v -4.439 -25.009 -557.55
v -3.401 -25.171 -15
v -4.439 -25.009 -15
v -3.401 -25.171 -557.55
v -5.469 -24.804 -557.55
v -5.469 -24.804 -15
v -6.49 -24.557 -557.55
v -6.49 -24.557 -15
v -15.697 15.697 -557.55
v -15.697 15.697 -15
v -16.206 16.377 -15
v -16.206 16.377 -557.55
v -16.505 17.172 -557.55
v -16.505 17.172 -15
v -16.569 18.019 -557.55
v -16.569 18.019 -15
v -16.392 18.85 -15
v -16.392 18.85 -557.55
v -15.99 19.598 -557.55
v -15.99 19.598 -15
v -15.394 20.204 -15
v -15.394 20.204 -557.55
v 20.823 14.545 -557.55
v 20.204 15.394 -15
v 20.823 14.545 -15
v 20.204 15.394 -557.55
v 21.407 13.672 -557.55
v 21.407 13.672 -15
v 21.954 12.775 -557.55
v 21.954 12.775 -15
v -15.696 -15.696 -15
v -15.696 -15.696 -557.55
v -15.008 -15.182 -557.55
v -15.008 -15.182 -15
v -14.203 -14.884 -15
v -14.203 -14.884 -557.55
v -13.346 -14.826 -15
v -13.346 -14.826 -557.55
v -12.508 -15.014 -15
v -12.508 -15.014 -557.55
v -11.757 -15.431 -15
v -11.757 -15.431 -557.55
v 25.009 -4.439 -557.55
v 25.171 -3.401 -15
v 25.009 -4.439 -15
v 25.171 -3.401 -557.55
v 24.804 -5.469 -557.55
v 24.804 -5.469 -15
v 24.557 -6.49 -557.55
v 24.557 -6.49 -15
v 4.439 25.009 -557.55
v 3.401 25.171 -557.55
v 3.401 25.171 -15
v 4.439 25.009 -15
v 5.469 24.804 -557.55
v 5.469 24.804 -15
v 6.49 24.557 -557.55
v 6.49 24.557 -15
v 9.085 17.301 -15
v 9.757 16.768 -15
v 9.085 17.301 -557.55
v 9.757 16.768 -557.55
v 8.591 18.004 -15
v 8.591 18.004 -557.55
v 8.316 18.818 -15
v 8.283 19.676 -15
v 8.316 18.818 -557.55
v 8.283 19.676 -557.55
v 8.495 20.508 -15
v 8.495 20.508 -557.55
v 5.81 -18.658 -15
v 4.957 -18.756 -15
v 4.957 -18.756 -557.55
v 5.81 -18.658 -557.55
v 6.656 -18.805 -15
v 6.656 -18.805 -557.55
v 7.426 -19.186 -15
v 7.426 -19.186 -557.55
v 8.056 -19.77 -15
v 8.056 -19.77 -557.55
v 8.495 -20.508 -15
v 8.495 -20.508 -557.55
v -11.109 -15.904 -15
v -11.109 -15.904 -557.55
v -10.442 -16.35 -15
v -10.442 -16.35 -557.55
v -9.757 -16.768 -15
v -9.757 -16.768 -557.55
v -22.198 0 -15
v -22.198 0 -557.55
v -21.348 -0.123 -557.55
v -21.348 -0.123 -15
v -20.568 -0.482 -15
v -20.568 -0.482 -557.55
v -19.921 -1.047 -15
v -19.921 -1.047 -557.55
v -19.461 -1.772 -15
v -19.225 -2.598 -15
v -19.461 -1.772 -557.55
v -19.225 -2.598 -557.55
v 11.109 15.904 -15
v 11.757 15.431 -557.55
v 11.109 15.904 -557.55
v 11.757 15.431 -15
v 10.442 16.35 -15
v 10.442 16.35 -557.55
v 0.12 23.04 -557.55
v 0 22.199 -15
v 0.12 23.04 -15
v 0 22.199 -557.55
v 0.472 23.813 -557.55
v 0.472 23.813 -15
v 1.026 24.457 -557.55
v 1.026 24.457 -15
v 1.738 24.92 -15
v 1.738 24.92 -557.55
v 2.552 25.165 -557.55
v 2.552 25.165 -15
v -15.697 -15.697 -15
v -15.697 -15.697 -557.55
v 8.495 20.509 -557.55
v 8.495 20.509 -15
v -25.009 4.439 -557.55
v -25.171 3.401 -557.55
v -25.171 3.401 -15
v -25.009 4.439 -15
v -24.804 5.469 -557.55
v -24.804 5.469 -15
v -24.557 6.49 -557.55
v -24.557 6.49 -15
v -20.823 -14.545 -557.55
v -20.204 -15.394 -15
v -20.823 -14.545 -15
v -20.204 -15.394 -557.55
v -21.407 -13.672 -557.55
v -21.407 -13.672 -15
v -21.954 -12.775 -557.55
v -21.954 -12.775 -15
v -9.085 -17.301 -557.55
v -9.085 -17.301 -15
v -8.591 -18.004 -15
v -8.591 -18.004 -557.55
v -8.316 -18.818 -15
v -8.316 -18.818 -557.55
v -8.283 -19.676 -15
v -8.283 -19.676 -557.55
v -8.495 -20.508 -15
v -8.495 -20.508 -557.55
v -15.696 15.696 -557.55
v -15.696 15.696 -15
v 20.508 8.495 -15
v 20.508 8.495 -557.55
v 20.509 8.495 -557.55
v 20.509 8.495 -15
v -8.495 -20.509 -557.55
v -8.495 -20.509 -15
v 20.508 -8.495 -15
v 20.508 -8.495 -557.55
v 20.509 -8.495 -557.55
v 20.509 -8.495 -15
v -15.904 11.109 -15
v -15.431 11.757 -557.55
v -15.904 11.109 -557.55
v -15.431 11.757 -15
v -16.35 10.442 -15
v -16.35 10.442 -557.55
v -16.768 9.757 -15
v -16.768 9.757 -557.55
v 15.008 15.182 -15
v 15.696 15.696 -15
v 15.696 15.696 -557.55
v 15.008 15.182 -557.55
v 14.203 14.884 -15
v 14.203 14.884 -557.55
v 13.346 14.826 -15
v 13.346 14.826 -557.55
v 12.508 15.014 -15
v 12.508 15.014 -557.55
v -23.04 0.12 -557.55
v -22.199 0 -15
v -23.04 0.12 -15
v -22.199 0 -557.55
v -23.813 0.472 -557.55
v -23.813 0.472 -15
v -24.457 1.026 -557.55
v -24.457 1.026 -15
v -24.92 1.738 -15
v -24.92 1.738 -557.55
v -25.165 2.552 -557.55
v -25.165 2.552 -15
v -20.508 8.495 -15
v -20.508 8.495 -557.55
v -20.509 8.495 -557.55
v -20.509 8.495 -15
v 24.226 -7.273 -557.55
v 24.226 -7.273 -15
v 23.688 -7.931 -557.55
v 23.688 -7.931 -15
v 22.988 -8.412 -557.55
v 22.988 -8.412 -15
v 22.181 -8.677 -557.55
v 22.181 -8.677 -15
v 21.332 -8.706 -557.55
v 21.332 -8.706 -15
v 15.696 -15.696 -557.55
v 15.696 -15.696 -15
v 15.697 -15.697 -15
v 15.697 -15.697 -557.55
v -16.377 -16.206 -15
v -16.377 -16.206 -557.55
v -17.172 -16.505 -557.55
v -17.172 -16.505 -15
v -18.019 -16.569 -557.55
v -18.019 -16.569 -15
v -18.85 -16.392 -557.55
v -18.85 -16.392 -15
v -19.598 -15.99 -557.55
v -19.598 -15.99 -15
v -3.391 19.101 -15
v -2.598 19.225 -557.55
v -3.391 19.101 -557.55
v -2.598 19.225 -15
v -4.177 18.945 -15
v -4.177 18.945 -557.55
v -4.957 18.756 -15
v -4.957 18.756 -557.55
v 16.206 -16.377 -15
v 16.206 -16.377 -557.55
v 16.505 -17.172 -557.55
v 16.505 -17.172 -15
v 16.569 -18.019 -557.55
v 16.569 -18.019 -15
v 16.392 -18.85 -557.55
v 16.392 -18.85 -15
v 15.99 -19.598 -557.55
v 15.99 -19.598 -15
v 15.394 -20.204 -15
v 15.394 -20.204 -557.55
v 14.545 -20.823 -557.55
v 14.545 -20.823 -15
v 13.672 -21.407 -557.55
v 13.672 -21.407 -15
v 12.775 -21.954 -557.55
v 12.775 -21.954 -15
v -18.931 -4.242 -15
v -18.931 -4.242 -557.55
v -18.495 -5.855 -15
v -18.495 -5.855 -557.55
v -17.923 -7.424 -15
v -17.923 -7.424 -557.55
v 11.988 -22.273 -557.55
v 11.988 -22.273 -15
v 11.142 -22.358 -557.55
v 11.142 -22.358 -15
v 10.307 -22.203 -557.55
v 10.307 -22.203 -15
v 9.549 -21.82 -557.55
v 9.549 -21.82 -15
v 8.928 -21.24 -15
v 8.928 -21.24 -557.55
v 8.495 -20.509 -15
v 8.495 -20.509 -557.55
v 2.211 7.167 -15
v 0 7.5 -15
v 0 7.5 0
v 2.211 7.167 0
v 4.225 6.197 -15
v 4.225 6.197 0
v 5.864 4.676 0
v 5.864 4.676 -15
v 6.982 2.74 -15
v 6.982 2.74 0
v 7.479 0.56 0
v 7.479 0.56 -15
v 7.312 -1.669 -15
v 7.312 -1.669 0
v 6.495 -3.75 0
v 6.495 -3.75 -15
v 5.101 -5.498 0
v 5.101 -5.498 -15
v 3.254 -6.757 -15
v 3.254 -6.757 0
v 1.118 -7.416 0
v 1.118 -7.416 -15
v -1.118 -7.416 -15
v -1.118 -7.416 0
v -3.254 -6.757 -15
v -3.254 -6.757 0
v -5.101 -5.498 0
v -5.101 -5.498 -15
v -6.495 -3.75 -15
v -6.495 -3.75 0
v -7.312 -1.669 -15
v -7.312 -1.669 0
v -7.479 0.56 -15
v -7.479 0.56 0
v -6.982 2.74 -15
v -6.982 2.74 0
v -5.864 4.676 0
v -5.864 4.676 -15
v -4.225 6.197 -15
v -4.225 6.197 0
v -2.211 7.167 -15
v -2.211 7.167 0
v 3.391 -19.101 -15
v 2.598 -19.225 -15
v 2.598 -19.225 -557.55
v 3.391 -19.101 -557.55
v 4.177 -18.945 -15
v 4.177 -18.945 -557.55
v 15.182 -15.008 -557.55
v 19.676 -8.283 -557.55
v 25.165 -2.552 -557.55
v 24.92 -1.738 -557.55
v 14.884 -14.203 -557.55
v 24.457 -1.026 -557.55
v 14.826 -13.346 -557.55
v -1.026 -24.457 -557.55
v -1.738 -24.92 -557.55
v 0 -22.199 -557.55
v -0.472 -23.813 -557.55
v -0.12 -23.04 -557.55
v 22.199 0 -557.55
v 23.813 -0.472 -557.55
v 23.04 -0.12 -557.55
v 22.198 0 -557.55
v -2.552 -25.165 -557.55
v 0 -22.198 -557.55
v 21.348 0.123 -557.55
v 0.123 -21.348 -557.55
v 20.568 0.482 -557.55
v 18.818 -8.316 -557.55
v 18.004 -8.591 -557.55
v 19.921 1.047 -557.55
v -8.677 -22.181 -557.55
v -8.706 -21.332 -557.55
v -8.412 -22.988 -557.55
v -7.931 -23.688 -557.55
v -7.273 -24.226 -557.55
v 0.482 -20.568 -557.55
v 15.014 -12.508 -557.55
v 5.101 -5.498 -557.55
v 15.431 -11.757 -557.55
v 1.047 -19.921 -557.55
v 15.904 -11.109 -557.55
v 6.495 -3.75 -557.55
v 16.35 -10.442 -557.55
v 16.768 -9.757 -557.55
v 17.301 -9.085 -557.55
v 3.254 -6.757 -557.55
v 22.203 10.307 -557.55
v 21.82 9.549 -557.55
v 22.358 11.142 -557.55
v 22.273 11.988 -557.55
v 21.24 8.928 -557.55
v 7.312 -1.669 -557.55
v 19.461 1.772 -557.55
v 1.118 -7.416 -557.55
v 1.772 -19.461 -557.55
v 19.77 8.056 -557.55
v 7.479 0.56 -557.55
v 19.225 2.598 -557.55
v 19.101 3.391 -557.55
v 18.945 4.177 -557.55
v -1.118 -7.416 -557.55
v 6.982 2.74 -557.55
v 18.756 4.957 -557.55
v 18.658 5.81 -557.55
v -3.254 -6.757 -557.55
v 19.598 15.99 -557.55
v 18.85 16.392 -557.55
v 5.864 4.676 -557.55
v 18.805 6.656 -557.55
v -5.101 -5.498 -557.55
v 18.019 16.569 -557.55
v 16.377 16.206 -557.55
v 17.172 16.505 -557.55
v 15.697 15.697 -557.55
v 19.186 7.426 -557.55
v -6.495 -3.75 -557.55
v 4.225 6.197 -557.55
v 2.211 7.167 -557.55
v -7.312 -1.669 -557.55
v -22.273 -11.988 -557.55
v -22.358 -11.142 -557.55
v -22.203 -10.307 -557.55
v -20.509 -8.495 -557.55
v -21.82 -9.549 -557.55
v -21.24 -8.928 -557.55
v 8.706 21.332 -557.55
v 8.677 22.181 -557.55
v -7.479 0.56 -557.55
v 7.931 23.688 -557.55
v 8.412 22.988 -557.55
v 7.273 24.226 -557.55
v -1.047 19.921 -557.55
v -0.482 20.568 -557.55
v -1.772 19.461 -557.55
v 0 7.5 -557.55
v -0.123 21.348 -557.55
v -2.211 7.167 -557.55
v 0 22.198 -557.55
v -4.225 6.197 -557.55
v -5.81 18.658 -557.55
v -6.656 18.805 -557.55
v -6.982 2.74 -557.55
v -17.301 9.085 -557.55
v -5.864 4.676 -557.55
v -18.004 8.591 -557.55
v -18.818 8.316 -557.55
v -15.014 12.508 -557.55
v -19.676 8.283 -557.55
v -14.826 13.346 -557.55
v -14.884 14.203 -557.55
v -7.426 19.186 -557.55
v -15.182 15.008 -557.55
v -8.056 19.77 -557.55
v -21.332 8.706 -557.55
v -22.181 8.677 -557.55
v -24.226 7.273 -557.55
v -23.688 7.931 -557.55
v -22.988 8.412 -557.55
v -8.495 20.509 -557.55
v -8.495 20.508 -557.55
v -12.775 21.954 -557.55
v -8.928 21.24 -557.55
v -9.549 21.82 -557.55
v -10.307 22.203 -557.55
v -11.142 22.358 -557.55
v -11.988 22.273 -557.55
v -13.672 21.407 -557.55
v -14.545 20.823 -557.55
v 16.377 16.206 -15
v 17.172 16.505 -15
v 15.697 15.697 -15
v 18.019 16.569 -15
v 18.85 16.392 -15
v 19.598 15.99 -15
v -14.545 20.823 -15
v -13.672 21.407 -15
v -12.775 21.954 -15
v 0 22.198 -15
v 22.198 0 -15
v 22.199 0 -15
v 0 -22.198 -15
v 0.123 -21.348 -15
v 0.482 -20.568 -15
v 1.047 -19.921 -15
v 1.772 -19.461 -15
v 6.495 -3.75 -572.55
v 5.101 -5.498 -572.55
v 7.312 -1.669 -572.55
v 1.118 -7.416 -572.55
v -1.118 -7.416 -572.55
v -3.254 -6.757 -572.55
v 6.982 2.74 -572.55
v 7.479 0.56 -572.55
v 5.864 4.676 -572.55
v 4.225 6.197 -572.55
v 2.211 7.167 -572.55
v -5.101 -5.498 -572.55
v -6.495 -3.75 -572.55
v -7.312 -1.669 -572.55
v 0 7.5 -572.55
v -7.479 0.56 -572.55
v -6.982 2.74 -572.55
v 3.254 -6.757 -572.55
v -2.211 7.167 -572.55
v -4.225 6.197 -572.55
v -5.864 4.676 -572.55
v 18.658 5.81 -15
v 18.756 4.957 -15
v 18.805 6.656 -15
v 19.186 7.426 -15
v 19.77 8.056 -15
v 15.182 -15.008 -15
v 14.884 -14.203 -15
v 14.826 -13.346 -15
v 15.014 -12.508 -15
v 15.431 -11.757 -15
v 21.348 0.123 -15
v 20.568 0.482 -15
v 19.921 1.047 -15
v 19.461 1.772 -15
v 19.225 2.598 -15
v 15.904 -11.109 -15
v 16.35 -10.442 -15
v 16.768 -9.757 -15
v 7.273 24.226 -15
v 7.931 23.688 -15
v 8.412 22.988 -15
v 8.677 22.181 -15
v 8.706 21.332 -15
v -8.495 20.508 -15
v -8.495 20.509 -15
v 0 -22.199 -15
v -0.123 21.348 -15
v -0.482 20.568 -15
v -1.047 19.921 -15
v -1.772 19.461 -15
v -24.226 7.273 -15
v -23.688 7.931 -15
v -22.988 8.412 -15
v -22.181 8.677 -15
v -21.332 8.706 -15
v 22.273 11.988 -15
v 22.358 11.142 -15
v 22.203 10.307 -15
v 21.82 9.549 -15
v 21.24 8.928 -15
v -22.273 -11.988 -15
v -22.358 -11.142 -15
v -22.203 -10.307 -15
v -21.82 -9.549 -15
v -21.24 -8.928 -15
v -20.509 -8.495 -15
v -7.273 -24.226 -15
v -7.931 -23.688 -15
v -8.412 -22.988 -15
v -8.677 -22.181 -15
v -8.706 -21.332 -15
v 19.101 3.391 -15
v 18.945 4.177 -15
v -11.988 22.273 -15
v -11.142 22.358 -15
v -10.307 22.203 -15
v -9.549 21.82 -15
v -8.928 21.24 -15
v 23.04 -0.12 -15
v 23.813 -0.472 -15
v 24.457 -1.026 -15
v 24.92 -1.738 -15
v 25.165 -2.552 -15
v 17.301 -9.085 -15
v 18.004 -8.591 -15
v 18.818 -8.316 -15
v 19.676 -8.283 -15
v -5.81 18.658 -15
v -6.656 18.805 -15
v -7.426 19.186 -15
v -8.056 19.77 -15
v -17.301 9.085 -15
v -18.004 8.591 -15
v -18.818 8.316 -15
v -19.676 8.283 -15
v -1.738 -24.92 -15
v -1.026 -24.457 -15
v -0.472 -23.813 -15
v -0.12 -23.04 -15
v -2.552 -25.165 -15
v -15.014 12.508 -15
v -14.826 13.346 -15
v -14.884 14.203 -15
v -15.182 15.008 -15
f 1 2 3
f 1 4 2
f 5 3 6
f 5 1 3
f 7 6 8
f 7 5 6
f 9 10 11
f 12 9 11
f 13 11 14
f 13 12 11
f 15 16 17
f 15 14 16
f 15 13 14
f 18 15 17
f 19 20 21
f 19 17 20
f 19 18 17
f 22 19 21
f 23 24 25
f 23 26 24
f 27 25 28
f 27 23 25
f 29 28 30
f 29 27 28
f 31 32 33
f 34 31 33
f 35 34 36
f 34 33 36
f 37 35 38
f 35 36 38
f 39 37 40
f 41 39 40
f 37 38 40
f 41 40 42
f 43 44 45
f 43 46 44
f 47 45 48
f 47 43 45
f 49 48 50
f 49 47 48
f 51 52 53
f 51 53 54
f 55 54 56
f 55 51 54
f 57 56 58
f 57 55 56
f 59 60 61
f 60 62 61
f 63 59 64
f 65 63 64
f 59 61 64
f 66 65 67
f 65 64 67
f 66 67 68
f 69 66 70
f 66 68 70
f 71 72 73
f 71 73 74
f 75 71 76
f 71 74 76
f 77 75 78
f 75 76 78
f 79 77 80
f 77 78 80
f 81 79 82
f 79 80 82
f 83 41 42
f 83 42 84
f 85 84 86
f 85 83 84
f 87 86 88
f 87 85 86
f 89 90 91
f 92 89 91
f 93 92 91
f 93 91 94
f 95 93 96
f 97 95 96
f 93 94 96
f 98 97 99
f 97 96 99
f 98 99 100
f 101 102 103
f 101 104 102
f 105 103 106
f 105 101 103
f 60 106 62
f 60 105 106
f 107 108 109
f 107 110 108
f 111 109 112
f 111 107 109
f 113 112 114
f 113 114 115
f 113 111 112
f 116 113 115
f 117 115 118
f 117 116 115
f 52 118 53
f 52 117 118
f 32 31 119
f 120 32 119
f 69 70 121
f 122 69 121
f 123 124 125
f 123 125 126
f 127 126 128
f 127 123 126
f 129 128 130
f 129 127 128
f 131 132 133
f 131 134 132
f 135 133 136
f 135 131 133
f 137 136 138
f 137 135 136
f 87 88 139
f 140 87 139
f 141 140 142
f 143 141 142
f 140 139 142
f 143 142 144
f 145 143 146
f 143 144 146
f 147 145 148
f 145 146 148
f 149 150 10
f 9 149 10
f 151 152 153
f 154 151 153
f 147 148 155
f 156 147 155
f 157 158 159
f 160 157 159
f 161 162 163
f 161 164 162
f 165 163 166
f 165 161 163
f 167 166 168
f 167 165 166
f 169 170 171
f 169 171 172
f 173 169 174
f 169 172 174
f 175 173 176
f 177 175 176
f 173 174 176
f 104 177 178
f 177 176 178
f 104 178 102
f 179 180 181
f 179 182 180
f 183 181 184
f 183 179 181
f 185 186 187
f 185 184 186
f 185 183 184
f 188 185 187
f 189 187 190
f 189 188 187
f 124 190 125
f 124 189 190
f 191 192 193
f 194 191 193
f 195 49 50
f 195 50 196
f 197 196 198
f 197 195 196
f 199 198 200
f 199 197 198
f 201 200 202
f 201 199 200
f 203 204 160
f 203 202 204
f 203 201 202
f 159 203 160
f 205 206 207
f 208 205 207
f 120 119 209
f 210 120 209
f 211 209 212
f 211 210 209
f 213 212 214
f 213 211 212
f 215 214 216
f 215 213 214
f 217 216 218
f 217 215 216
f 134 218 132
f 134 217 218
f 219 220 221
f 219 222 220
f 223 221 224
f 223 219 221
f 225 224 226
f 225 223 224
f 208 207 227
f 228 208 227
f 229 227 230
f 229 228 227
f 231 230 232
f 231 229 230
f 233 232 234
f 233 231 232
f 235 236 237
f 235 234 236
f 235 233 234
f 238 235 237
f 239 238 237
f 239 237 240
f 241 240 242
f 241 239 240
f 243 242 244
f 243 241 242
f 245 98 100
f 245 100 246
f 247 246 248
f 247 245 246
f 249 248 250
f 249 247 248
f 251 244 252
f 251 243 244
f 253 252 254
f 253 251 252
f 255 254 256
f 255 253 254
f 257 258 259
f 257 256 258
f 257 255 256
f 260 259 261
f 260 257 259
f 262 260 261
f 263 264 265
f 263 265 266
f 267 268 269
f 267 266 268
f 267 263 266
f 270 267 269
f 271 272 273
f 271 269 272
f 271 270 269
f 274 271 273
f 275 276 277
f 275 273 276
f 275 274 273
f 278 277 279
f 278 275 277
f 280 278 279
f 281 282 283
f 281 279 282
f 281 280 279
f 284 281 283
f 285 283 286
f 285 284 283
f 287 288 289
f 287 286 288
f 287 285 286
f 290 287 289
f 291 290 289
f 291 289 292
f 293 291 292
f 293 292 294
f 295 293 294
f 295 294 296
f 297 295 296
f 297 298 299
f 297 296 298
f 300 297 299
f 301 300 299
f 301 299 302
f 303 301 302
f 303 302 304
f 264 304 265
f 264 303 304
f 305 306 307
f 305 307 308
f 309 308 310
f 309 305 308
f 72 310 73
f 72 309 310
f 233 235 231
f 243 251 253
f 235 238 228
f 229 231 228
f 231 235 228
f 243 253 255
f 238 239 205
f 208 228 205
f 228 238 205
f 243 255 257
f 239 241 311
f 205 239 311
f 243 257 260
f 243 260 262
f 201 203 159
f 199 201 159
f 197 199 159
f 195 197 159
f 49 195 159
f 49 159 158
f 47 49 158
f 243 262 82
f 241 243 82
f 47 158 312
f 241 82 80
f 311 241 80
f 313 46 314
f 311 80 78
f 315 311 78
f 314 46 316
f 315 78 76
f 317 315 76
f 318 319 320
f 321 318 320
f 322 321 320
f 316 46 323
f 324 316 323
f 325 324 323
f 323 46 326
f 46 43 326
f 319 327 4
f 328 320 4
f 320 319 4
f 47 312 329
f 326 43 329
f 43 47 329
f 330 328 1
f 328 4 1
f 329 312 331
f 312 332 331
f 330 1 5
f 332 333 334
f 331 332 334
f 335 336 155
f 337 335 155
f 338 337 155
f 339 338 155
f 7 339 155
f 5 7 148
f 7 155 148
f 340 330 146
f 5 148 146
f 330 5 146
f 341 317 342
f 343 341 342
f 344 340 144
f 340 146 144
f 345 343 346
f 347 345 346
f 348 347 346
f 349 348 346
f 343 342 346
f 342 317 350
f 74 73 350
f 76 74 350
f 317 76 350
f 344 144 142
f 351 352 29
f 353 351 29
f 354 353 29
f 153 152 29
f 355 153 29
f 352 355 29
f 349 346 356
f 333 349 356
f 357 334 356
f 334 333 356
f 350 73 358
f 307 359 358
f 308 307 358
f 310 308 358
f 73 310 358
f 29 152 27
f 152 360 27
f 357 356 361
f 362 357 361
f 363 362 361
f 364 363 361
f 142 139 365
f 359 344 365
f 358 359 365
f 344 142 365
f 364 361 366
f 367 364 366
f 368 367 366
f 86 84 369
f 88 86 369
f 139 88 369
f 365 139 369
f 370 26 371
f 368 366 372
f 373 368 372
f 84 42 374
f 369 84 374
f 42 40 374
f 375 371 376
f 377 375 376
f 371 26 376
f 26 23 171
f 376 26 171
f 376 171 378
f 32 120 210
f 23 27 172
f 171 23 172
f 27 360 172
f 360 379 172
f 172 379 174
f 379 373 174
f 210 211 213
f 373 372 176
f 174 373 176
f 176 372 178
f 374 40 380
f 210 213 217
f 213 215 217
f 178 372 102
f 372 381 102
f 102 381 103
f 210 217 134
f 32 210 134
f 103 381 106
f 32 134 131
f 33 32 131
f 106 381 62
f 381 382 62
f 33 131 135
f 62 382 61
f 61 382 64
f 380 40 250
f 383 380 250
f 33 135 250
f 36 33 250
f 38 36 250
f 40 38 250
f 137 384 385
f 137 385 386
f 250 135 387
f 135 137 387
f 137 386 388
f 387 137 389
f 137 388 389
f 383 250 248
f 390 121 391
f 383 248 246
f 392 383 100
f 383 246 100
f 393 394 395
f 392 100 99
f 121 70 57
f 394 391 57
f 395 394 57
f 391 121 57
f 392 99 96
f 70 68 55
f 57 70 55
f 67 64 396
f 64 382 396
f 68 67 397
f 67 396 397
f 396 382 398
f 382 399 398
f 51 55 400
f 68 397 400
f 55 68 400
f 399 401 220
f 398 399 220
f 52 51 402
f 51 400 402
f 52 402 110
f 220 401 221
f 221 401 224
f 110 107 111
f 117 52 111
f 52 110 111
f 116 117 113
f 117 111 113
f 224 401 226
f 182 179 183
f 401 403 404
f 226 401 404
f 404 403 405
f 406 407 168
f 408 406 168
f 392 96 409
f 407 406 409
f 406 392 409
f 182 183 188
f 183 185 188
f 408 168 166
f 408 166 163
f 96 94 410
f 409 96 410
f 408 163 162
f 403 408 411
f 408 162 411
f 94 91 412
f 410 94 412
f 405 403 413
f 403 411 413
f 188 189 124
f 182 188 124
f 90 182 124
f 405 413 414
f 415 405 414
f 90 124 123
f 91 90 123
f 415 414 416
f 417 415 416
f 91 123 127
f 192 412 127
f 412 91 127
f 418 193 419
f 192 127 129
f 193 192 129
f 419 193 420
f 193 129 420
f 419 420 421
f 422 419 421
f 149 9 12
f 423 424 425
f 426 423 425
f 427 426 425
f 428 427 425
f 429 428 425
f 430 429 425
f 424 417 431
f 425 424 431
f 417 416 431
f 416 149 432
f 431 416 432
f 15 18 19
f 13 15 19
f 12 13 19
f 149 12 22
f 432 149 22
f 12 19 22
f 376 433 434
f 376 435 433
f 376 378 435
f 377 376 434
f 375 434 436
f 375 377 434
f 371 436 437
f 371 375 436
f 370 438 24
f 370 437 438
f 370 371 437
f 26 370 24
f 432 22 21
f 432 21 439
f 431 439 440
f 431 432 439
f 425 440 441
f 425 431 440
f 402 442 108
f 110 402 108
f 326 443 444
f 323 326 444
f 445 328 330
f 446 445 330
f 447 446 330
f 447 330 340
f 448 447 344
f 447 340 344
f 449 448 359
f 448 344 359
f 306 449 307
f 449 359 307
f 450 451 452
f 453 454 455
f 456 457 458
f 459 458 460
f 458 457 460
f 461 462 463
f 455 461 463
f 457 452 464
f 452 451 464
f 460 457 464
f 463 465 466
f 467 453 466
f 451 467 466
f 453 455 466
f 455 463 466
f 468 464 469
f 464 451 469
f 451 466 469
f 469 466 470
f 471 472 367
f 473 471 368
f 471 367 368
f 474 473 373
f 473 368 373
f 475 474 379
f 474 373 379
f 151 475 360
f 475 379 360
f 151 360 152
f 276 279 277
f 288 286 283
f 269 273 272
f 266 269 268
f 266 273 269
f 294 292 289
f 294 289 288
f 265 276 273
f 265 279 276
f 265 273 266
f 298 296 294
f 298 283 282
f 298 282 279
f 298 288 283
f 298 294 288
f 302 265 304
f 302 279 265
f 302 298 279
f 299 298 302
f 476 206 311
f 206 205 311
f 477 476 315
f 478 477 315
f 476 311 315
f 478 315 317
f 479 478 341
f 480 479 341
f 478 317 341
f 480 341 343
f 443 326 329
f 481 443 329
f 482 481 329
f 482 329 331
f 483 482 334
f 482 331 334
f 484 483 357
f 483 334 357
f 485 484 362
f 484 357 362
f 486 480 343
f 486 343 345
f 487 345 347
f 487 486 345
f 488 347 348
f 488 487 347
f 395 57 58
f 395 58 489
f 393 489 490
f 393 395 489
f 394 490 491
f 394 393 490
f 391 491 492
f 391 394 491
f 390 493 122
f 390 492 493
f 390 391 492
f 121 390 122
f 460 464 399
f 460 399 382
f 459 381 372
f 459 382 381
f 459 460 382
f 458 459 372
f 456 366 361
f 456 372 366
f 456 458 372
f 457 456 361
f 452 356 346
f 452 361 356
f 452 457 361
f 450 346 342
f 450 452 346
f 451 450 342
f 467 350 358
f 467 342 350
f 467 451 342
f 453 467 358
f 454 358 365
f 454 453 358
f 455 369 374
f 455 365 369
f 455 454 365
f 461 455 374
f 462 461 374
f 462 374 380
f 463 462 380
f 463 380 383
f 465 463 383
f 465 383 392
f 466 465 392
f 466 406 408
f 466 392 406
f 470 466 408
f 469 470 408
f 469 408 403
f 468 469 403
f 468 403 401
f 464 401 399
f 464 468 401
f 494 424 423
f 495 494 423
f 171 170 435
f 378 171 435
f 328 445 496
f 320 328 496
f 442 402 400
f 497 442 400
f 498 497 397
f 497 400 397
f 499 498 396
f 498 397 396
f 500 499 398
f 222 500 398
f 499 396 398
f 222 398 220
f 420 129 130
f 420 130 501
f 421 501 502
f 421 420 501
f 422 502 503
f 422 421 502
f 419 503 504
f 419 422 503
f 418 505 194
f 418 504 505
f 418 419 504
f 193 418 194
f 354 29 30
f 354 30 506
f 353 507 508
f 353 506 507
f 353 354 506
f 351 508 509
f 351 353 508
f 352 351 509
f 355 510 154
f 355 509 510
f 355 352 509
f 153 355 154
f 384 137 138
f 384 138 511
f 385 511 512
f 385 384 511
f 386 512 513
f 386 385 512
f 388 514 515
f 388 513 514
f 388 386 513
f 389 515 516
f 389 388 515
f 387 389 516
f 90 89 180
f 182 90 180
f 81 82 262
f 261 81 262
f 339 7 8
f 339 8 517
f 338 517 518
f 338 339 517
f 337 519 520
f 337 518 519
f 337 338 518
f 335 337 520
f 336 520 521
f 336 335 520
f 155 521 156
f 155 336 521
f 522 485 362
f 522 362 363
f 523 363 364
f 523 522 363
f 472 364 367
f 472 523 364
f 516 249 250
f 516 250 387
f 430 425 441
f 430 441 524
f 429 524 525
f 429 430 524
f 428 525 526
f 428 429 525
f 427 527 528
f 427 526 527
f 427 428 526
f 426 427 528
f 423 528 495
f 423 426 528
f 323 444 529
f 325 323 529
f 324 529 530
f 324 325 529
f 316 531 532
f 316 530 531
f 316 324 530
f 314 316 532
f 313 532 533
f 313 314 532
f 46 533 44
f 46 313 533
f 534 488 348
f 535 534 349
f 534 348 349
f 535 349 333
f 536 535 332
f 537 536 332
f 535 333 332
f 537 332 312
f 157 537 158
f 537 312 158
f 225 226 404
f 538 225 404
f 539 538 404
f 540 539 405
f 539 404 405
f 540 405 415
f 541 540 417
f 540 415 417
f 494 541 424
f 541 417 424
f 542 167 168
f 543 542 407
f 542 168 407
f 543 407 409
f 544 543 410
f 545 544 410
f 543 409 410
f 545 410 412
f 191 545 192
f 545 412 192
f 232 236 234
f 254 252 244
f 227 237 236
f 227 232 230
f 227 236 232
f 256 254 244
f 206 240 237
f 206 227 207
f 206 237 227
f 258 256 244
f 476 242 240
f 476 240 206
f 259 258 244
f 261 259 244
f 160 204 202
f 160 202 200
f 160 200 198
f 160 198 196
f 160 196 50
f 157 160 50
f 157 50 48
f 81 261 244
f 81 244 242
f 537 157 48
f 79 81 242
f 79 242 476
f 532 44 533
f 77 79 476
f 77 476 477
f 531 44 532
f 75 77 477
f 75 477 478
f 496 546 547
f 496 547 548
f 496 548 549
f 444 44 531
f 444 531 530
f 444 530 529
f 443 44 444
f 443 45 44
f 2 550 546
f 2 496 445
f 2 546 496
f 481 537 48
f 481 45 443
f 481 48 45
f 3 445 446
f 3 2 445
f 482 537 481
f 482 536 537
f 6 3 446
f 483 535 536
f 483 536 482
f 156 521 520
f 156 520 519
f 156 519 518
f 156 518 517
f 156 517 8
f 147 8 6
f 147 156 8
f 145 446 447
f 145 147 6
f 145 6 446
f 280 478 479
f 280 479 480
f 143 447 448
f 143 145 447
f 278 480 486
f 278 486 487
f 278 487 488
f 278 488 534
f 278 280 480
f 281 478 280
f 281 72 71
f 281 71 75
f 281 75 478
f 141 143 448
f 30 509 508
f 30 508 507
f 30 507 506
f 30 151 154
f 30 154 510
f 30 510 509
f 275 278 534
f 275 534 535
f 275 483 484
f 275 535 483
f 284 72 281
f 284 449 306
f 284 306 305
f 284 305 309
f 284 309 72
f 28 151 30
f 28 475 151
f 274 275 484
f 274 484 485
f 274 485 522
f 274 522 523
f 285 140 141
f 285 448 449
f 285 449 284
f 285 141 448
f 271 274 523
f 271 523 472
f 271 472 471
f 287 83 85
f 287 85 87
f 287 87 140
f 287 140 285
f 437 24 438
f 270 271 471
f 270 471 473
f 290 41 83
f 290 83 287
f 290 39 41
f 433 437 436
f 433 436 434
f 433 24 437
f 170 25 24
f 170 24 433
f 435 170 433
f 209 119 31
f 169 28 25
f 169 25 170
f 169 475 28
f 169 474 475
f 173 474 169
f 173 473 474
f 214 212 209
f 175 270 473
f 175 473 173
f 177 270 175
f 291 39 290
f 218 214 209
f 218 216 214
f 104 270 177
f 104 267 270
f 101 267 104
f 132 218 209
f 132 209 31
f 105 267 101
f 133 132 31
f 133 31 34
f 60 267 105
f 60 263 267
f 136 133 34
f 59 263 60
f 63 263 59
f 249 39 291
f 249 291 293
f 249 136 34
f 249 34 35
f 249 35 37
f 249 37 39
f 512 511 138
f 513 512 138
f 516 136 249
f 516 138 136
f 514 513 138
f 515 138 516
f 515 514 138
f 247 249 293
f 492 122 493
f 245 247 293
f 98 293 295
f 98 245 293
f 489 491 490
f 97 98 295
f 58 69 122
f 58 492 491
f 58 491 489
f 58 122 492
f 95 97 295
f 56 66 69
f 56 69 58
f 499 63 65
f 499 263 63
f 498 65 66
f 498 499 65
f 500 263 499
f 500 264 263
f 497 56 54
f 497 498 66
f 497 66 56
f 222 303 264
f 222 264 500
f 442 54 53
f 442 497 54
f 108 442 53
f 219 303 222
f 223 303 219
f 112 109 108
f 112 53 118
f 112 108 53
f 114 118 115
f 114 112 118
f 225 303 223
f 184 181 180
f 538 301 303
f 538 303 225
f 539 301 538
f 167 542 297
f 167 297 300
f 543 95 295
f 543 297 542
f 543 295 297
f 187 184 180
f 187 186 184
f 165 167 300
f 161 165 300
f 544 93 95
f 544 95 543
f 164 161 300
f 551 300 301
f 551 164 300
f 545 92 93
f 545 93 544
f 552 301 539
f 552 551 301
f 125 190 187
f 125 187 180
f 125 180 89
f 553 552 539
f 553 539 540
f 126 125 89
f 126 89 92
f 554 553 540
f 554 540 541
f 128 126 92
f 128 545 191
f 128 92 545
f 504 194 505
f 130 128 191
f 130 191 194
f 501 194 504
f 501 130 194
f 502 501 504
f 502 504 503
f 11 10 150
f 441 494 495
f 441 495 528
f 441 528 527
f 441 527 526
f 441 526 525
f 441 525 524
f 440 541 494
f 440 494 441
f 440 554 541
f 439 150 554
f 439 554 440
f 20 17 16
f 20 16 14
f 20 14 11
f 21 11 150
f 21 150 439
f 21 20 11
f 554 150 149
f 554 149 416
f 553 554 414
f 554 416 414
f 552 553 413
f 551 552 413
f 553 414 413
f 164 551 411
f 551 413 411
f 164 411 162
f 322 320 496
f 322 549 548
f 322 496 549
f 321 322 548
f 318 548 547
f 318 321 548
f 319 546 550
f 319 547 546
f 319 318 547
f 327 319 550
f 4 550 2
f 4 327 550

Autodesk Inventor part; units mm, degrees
ref_plane "YZ Plane" through (0, 0, 0) normal (1, 0, 0) x (0, 1, 0)
ref_plane "XZ Plane" through (0, 0, 0) normal (0, 1, 0) x (-1, 0, 0)
ref_plane "XY Plane" through (0, 0, 0) normal (0, 0, 1) x (1, 0, 0)
sketch "Esboço1" plane through (0, 0, 0) normal (1, 0, 0) x (0, 1, 0)
  line L0 (0, 0) -> (0, -572.55)
  line L1 (0, 0) -> (7.5, 0)
  line L2 (7.5, 0) -> (7.5, -572.55)
  line L3 (7.5, -572.55) -> (0, -572.55)
  line L4 (0, -572.55) -> (0, 0)
  line L5 (7.5, -15) -> (25.4, -15)
  line L6 (25.4, -15) -> (25.4, -557.55)
  line L7 (25.4, -557.55) -> (7.5, -557.55)
  line L8 (7.5, -557.55) -> (7.5, -15)
  point P0 (3.75, 0)
  point P1 (3.75, -572.55)
  point P2 (0, -545.49)
  point P3 (7.5, -557.55)
  dimension "d0" = 572.55
  dimension "d1" = 7.5
  dimension "d2" = 25.4
  dimension "d3" = 15
  dimension "d4" = 15
revolve "Revolução1" add sketch "Esboço1" angle 360 about axis through (0, 0, -572.55) along (0, 0, 1)
sketch "Esboço2" plane through (0, 0, -15) normal (0, 0, 1) x (1, 0, 0)
  circle A0 centre (0, 0) radius 7.5 projected
  circle A1 centre (0, 0) radius 25.4 projected
  circle A2 centre (0, 0) radius 7.5 projected
  line L0 (0, 0) -> (0, 25.4)
  line L1 (0, 0) -> (-25.4, 0)
  line L2 (0, 0) -> (0, -25.4)
  line L3 (0, 0) -> (25.4, 0)
  line L4 (0, 0) -> (17.9605, 17.9605)
  line L5 (0, 0) -> (9.7202, 23.4665)
  line L6 (0, 0) -> (23.4665, 9.7202)
  line L7 (0, 0) -> (-17.9605, 17.9605)
  line L8 (0, 0) -> (-9.7202, 23.4665)
  line L9 (0, 0) -> (-23.4665, 9.7202)
  line L10 (0, 0) -> (17.9605, -17.9605)
  line L11 (0, 0) -> (9.7202, -23.4665)
  line L12 (0, 0) -> (23.4665, -9.7202)
  line L13 (0, 0) -> (-9.7202, -23.4665)
  line L14 (0, 0) -> (-17.9605, -17.9605)
  line L15 (0, 0) -> (-23.4665, -9.7202)
  circle A3 centre (0, 0) radius 19.4
  point P0 (0, 0)
  point P1 (-17.9233, 7.4241)
  point P2 (-13.7179, 13.7179)
  point P3 (-17.9233, -7.4241)
  point P4 (-19.4, 0)
  point P5 (-7.4241, -17.9233)
  point P6 (-13.7179, -13.7179)
  point P7 (7.4241, -17.9233)
  point P8 (0, -19.4)
  point P9 (17.9233, -7.4241)
  point P10 (13.7179, -13.7179)
  point P11 (17.9233, 7.4241)
  point P12 (19.4, 0)
  point P13 (7.4241, 17.9233)
  point P14 (13.7179, 13.7179)
  point P15 (-7.4241, 17.9233)
  point P16 (0, 19.4)
  dimension "d8" = 22.5
  dimension "d9" = 22.5
  dimension "d10" = 45
  dimension "d11" = 6
extrude "Extrusão1" cut sketch "Esboço2" against normal up to surface (542.55 mm away) contours A3 L6 A1 L3 | L12 A1 L10 A3 | A3 L5 A1 L4 | A3 L8 A1 L0 | A3 L15 A1 L1 | A3 L11 A1 L2 | A3 L9 A1 L7 | L13 A1 L14 A3
fillet "Arredondamento1" radius 3 31 edges at (7.4241, 17.9233, -286.275) (13.7179, 13.7179, -286.275) (17.9605, 17.9605, -286.275) (9.7202, 23.4665, -286.275) (0, 25.4, -286.275) (0, 19.4, -286.275) (-9.7202, 23.4665, -286.275) (-7.4241, 17.9233, -286.275) (-23.4665, 9.7202, -286.275) (-17.9605, 17.9605, -286.275) (-17.9233, 7.4241, -286.275) (-13.7179, 13.7179, -286.275) (19.4, 0, -286.275) (17.9233, 7.4241, -286.275) (23.4665, 9.7202, -286.275) (25.4, 0, -286.275) (23.4665, -9.7202, -286.275) (17.9233, -7.4241, -286.275) (17.9605, -17.9605, -286.275) (13.7179, -13.7179, -286.275) (7.4241, -17.9233, -286.275) (9.7202, -23.4665, -286.275) (0, -19.4, -286.275) (-9.7202, -23.4665, -286.275) (-7.4241, -17.9233, -286.275) (-13.7179, -13.7179, -286.275) (-23.4665, -9.7202, -286.275) (-17.9605, -17.9605, -286.275) (-19.4, 0, -286.275) (-25.4, 0, -286.275) (0, -25.4, -286.275)
equation "\"d9\" = d8"
properties part number "Coletor - Intake"
